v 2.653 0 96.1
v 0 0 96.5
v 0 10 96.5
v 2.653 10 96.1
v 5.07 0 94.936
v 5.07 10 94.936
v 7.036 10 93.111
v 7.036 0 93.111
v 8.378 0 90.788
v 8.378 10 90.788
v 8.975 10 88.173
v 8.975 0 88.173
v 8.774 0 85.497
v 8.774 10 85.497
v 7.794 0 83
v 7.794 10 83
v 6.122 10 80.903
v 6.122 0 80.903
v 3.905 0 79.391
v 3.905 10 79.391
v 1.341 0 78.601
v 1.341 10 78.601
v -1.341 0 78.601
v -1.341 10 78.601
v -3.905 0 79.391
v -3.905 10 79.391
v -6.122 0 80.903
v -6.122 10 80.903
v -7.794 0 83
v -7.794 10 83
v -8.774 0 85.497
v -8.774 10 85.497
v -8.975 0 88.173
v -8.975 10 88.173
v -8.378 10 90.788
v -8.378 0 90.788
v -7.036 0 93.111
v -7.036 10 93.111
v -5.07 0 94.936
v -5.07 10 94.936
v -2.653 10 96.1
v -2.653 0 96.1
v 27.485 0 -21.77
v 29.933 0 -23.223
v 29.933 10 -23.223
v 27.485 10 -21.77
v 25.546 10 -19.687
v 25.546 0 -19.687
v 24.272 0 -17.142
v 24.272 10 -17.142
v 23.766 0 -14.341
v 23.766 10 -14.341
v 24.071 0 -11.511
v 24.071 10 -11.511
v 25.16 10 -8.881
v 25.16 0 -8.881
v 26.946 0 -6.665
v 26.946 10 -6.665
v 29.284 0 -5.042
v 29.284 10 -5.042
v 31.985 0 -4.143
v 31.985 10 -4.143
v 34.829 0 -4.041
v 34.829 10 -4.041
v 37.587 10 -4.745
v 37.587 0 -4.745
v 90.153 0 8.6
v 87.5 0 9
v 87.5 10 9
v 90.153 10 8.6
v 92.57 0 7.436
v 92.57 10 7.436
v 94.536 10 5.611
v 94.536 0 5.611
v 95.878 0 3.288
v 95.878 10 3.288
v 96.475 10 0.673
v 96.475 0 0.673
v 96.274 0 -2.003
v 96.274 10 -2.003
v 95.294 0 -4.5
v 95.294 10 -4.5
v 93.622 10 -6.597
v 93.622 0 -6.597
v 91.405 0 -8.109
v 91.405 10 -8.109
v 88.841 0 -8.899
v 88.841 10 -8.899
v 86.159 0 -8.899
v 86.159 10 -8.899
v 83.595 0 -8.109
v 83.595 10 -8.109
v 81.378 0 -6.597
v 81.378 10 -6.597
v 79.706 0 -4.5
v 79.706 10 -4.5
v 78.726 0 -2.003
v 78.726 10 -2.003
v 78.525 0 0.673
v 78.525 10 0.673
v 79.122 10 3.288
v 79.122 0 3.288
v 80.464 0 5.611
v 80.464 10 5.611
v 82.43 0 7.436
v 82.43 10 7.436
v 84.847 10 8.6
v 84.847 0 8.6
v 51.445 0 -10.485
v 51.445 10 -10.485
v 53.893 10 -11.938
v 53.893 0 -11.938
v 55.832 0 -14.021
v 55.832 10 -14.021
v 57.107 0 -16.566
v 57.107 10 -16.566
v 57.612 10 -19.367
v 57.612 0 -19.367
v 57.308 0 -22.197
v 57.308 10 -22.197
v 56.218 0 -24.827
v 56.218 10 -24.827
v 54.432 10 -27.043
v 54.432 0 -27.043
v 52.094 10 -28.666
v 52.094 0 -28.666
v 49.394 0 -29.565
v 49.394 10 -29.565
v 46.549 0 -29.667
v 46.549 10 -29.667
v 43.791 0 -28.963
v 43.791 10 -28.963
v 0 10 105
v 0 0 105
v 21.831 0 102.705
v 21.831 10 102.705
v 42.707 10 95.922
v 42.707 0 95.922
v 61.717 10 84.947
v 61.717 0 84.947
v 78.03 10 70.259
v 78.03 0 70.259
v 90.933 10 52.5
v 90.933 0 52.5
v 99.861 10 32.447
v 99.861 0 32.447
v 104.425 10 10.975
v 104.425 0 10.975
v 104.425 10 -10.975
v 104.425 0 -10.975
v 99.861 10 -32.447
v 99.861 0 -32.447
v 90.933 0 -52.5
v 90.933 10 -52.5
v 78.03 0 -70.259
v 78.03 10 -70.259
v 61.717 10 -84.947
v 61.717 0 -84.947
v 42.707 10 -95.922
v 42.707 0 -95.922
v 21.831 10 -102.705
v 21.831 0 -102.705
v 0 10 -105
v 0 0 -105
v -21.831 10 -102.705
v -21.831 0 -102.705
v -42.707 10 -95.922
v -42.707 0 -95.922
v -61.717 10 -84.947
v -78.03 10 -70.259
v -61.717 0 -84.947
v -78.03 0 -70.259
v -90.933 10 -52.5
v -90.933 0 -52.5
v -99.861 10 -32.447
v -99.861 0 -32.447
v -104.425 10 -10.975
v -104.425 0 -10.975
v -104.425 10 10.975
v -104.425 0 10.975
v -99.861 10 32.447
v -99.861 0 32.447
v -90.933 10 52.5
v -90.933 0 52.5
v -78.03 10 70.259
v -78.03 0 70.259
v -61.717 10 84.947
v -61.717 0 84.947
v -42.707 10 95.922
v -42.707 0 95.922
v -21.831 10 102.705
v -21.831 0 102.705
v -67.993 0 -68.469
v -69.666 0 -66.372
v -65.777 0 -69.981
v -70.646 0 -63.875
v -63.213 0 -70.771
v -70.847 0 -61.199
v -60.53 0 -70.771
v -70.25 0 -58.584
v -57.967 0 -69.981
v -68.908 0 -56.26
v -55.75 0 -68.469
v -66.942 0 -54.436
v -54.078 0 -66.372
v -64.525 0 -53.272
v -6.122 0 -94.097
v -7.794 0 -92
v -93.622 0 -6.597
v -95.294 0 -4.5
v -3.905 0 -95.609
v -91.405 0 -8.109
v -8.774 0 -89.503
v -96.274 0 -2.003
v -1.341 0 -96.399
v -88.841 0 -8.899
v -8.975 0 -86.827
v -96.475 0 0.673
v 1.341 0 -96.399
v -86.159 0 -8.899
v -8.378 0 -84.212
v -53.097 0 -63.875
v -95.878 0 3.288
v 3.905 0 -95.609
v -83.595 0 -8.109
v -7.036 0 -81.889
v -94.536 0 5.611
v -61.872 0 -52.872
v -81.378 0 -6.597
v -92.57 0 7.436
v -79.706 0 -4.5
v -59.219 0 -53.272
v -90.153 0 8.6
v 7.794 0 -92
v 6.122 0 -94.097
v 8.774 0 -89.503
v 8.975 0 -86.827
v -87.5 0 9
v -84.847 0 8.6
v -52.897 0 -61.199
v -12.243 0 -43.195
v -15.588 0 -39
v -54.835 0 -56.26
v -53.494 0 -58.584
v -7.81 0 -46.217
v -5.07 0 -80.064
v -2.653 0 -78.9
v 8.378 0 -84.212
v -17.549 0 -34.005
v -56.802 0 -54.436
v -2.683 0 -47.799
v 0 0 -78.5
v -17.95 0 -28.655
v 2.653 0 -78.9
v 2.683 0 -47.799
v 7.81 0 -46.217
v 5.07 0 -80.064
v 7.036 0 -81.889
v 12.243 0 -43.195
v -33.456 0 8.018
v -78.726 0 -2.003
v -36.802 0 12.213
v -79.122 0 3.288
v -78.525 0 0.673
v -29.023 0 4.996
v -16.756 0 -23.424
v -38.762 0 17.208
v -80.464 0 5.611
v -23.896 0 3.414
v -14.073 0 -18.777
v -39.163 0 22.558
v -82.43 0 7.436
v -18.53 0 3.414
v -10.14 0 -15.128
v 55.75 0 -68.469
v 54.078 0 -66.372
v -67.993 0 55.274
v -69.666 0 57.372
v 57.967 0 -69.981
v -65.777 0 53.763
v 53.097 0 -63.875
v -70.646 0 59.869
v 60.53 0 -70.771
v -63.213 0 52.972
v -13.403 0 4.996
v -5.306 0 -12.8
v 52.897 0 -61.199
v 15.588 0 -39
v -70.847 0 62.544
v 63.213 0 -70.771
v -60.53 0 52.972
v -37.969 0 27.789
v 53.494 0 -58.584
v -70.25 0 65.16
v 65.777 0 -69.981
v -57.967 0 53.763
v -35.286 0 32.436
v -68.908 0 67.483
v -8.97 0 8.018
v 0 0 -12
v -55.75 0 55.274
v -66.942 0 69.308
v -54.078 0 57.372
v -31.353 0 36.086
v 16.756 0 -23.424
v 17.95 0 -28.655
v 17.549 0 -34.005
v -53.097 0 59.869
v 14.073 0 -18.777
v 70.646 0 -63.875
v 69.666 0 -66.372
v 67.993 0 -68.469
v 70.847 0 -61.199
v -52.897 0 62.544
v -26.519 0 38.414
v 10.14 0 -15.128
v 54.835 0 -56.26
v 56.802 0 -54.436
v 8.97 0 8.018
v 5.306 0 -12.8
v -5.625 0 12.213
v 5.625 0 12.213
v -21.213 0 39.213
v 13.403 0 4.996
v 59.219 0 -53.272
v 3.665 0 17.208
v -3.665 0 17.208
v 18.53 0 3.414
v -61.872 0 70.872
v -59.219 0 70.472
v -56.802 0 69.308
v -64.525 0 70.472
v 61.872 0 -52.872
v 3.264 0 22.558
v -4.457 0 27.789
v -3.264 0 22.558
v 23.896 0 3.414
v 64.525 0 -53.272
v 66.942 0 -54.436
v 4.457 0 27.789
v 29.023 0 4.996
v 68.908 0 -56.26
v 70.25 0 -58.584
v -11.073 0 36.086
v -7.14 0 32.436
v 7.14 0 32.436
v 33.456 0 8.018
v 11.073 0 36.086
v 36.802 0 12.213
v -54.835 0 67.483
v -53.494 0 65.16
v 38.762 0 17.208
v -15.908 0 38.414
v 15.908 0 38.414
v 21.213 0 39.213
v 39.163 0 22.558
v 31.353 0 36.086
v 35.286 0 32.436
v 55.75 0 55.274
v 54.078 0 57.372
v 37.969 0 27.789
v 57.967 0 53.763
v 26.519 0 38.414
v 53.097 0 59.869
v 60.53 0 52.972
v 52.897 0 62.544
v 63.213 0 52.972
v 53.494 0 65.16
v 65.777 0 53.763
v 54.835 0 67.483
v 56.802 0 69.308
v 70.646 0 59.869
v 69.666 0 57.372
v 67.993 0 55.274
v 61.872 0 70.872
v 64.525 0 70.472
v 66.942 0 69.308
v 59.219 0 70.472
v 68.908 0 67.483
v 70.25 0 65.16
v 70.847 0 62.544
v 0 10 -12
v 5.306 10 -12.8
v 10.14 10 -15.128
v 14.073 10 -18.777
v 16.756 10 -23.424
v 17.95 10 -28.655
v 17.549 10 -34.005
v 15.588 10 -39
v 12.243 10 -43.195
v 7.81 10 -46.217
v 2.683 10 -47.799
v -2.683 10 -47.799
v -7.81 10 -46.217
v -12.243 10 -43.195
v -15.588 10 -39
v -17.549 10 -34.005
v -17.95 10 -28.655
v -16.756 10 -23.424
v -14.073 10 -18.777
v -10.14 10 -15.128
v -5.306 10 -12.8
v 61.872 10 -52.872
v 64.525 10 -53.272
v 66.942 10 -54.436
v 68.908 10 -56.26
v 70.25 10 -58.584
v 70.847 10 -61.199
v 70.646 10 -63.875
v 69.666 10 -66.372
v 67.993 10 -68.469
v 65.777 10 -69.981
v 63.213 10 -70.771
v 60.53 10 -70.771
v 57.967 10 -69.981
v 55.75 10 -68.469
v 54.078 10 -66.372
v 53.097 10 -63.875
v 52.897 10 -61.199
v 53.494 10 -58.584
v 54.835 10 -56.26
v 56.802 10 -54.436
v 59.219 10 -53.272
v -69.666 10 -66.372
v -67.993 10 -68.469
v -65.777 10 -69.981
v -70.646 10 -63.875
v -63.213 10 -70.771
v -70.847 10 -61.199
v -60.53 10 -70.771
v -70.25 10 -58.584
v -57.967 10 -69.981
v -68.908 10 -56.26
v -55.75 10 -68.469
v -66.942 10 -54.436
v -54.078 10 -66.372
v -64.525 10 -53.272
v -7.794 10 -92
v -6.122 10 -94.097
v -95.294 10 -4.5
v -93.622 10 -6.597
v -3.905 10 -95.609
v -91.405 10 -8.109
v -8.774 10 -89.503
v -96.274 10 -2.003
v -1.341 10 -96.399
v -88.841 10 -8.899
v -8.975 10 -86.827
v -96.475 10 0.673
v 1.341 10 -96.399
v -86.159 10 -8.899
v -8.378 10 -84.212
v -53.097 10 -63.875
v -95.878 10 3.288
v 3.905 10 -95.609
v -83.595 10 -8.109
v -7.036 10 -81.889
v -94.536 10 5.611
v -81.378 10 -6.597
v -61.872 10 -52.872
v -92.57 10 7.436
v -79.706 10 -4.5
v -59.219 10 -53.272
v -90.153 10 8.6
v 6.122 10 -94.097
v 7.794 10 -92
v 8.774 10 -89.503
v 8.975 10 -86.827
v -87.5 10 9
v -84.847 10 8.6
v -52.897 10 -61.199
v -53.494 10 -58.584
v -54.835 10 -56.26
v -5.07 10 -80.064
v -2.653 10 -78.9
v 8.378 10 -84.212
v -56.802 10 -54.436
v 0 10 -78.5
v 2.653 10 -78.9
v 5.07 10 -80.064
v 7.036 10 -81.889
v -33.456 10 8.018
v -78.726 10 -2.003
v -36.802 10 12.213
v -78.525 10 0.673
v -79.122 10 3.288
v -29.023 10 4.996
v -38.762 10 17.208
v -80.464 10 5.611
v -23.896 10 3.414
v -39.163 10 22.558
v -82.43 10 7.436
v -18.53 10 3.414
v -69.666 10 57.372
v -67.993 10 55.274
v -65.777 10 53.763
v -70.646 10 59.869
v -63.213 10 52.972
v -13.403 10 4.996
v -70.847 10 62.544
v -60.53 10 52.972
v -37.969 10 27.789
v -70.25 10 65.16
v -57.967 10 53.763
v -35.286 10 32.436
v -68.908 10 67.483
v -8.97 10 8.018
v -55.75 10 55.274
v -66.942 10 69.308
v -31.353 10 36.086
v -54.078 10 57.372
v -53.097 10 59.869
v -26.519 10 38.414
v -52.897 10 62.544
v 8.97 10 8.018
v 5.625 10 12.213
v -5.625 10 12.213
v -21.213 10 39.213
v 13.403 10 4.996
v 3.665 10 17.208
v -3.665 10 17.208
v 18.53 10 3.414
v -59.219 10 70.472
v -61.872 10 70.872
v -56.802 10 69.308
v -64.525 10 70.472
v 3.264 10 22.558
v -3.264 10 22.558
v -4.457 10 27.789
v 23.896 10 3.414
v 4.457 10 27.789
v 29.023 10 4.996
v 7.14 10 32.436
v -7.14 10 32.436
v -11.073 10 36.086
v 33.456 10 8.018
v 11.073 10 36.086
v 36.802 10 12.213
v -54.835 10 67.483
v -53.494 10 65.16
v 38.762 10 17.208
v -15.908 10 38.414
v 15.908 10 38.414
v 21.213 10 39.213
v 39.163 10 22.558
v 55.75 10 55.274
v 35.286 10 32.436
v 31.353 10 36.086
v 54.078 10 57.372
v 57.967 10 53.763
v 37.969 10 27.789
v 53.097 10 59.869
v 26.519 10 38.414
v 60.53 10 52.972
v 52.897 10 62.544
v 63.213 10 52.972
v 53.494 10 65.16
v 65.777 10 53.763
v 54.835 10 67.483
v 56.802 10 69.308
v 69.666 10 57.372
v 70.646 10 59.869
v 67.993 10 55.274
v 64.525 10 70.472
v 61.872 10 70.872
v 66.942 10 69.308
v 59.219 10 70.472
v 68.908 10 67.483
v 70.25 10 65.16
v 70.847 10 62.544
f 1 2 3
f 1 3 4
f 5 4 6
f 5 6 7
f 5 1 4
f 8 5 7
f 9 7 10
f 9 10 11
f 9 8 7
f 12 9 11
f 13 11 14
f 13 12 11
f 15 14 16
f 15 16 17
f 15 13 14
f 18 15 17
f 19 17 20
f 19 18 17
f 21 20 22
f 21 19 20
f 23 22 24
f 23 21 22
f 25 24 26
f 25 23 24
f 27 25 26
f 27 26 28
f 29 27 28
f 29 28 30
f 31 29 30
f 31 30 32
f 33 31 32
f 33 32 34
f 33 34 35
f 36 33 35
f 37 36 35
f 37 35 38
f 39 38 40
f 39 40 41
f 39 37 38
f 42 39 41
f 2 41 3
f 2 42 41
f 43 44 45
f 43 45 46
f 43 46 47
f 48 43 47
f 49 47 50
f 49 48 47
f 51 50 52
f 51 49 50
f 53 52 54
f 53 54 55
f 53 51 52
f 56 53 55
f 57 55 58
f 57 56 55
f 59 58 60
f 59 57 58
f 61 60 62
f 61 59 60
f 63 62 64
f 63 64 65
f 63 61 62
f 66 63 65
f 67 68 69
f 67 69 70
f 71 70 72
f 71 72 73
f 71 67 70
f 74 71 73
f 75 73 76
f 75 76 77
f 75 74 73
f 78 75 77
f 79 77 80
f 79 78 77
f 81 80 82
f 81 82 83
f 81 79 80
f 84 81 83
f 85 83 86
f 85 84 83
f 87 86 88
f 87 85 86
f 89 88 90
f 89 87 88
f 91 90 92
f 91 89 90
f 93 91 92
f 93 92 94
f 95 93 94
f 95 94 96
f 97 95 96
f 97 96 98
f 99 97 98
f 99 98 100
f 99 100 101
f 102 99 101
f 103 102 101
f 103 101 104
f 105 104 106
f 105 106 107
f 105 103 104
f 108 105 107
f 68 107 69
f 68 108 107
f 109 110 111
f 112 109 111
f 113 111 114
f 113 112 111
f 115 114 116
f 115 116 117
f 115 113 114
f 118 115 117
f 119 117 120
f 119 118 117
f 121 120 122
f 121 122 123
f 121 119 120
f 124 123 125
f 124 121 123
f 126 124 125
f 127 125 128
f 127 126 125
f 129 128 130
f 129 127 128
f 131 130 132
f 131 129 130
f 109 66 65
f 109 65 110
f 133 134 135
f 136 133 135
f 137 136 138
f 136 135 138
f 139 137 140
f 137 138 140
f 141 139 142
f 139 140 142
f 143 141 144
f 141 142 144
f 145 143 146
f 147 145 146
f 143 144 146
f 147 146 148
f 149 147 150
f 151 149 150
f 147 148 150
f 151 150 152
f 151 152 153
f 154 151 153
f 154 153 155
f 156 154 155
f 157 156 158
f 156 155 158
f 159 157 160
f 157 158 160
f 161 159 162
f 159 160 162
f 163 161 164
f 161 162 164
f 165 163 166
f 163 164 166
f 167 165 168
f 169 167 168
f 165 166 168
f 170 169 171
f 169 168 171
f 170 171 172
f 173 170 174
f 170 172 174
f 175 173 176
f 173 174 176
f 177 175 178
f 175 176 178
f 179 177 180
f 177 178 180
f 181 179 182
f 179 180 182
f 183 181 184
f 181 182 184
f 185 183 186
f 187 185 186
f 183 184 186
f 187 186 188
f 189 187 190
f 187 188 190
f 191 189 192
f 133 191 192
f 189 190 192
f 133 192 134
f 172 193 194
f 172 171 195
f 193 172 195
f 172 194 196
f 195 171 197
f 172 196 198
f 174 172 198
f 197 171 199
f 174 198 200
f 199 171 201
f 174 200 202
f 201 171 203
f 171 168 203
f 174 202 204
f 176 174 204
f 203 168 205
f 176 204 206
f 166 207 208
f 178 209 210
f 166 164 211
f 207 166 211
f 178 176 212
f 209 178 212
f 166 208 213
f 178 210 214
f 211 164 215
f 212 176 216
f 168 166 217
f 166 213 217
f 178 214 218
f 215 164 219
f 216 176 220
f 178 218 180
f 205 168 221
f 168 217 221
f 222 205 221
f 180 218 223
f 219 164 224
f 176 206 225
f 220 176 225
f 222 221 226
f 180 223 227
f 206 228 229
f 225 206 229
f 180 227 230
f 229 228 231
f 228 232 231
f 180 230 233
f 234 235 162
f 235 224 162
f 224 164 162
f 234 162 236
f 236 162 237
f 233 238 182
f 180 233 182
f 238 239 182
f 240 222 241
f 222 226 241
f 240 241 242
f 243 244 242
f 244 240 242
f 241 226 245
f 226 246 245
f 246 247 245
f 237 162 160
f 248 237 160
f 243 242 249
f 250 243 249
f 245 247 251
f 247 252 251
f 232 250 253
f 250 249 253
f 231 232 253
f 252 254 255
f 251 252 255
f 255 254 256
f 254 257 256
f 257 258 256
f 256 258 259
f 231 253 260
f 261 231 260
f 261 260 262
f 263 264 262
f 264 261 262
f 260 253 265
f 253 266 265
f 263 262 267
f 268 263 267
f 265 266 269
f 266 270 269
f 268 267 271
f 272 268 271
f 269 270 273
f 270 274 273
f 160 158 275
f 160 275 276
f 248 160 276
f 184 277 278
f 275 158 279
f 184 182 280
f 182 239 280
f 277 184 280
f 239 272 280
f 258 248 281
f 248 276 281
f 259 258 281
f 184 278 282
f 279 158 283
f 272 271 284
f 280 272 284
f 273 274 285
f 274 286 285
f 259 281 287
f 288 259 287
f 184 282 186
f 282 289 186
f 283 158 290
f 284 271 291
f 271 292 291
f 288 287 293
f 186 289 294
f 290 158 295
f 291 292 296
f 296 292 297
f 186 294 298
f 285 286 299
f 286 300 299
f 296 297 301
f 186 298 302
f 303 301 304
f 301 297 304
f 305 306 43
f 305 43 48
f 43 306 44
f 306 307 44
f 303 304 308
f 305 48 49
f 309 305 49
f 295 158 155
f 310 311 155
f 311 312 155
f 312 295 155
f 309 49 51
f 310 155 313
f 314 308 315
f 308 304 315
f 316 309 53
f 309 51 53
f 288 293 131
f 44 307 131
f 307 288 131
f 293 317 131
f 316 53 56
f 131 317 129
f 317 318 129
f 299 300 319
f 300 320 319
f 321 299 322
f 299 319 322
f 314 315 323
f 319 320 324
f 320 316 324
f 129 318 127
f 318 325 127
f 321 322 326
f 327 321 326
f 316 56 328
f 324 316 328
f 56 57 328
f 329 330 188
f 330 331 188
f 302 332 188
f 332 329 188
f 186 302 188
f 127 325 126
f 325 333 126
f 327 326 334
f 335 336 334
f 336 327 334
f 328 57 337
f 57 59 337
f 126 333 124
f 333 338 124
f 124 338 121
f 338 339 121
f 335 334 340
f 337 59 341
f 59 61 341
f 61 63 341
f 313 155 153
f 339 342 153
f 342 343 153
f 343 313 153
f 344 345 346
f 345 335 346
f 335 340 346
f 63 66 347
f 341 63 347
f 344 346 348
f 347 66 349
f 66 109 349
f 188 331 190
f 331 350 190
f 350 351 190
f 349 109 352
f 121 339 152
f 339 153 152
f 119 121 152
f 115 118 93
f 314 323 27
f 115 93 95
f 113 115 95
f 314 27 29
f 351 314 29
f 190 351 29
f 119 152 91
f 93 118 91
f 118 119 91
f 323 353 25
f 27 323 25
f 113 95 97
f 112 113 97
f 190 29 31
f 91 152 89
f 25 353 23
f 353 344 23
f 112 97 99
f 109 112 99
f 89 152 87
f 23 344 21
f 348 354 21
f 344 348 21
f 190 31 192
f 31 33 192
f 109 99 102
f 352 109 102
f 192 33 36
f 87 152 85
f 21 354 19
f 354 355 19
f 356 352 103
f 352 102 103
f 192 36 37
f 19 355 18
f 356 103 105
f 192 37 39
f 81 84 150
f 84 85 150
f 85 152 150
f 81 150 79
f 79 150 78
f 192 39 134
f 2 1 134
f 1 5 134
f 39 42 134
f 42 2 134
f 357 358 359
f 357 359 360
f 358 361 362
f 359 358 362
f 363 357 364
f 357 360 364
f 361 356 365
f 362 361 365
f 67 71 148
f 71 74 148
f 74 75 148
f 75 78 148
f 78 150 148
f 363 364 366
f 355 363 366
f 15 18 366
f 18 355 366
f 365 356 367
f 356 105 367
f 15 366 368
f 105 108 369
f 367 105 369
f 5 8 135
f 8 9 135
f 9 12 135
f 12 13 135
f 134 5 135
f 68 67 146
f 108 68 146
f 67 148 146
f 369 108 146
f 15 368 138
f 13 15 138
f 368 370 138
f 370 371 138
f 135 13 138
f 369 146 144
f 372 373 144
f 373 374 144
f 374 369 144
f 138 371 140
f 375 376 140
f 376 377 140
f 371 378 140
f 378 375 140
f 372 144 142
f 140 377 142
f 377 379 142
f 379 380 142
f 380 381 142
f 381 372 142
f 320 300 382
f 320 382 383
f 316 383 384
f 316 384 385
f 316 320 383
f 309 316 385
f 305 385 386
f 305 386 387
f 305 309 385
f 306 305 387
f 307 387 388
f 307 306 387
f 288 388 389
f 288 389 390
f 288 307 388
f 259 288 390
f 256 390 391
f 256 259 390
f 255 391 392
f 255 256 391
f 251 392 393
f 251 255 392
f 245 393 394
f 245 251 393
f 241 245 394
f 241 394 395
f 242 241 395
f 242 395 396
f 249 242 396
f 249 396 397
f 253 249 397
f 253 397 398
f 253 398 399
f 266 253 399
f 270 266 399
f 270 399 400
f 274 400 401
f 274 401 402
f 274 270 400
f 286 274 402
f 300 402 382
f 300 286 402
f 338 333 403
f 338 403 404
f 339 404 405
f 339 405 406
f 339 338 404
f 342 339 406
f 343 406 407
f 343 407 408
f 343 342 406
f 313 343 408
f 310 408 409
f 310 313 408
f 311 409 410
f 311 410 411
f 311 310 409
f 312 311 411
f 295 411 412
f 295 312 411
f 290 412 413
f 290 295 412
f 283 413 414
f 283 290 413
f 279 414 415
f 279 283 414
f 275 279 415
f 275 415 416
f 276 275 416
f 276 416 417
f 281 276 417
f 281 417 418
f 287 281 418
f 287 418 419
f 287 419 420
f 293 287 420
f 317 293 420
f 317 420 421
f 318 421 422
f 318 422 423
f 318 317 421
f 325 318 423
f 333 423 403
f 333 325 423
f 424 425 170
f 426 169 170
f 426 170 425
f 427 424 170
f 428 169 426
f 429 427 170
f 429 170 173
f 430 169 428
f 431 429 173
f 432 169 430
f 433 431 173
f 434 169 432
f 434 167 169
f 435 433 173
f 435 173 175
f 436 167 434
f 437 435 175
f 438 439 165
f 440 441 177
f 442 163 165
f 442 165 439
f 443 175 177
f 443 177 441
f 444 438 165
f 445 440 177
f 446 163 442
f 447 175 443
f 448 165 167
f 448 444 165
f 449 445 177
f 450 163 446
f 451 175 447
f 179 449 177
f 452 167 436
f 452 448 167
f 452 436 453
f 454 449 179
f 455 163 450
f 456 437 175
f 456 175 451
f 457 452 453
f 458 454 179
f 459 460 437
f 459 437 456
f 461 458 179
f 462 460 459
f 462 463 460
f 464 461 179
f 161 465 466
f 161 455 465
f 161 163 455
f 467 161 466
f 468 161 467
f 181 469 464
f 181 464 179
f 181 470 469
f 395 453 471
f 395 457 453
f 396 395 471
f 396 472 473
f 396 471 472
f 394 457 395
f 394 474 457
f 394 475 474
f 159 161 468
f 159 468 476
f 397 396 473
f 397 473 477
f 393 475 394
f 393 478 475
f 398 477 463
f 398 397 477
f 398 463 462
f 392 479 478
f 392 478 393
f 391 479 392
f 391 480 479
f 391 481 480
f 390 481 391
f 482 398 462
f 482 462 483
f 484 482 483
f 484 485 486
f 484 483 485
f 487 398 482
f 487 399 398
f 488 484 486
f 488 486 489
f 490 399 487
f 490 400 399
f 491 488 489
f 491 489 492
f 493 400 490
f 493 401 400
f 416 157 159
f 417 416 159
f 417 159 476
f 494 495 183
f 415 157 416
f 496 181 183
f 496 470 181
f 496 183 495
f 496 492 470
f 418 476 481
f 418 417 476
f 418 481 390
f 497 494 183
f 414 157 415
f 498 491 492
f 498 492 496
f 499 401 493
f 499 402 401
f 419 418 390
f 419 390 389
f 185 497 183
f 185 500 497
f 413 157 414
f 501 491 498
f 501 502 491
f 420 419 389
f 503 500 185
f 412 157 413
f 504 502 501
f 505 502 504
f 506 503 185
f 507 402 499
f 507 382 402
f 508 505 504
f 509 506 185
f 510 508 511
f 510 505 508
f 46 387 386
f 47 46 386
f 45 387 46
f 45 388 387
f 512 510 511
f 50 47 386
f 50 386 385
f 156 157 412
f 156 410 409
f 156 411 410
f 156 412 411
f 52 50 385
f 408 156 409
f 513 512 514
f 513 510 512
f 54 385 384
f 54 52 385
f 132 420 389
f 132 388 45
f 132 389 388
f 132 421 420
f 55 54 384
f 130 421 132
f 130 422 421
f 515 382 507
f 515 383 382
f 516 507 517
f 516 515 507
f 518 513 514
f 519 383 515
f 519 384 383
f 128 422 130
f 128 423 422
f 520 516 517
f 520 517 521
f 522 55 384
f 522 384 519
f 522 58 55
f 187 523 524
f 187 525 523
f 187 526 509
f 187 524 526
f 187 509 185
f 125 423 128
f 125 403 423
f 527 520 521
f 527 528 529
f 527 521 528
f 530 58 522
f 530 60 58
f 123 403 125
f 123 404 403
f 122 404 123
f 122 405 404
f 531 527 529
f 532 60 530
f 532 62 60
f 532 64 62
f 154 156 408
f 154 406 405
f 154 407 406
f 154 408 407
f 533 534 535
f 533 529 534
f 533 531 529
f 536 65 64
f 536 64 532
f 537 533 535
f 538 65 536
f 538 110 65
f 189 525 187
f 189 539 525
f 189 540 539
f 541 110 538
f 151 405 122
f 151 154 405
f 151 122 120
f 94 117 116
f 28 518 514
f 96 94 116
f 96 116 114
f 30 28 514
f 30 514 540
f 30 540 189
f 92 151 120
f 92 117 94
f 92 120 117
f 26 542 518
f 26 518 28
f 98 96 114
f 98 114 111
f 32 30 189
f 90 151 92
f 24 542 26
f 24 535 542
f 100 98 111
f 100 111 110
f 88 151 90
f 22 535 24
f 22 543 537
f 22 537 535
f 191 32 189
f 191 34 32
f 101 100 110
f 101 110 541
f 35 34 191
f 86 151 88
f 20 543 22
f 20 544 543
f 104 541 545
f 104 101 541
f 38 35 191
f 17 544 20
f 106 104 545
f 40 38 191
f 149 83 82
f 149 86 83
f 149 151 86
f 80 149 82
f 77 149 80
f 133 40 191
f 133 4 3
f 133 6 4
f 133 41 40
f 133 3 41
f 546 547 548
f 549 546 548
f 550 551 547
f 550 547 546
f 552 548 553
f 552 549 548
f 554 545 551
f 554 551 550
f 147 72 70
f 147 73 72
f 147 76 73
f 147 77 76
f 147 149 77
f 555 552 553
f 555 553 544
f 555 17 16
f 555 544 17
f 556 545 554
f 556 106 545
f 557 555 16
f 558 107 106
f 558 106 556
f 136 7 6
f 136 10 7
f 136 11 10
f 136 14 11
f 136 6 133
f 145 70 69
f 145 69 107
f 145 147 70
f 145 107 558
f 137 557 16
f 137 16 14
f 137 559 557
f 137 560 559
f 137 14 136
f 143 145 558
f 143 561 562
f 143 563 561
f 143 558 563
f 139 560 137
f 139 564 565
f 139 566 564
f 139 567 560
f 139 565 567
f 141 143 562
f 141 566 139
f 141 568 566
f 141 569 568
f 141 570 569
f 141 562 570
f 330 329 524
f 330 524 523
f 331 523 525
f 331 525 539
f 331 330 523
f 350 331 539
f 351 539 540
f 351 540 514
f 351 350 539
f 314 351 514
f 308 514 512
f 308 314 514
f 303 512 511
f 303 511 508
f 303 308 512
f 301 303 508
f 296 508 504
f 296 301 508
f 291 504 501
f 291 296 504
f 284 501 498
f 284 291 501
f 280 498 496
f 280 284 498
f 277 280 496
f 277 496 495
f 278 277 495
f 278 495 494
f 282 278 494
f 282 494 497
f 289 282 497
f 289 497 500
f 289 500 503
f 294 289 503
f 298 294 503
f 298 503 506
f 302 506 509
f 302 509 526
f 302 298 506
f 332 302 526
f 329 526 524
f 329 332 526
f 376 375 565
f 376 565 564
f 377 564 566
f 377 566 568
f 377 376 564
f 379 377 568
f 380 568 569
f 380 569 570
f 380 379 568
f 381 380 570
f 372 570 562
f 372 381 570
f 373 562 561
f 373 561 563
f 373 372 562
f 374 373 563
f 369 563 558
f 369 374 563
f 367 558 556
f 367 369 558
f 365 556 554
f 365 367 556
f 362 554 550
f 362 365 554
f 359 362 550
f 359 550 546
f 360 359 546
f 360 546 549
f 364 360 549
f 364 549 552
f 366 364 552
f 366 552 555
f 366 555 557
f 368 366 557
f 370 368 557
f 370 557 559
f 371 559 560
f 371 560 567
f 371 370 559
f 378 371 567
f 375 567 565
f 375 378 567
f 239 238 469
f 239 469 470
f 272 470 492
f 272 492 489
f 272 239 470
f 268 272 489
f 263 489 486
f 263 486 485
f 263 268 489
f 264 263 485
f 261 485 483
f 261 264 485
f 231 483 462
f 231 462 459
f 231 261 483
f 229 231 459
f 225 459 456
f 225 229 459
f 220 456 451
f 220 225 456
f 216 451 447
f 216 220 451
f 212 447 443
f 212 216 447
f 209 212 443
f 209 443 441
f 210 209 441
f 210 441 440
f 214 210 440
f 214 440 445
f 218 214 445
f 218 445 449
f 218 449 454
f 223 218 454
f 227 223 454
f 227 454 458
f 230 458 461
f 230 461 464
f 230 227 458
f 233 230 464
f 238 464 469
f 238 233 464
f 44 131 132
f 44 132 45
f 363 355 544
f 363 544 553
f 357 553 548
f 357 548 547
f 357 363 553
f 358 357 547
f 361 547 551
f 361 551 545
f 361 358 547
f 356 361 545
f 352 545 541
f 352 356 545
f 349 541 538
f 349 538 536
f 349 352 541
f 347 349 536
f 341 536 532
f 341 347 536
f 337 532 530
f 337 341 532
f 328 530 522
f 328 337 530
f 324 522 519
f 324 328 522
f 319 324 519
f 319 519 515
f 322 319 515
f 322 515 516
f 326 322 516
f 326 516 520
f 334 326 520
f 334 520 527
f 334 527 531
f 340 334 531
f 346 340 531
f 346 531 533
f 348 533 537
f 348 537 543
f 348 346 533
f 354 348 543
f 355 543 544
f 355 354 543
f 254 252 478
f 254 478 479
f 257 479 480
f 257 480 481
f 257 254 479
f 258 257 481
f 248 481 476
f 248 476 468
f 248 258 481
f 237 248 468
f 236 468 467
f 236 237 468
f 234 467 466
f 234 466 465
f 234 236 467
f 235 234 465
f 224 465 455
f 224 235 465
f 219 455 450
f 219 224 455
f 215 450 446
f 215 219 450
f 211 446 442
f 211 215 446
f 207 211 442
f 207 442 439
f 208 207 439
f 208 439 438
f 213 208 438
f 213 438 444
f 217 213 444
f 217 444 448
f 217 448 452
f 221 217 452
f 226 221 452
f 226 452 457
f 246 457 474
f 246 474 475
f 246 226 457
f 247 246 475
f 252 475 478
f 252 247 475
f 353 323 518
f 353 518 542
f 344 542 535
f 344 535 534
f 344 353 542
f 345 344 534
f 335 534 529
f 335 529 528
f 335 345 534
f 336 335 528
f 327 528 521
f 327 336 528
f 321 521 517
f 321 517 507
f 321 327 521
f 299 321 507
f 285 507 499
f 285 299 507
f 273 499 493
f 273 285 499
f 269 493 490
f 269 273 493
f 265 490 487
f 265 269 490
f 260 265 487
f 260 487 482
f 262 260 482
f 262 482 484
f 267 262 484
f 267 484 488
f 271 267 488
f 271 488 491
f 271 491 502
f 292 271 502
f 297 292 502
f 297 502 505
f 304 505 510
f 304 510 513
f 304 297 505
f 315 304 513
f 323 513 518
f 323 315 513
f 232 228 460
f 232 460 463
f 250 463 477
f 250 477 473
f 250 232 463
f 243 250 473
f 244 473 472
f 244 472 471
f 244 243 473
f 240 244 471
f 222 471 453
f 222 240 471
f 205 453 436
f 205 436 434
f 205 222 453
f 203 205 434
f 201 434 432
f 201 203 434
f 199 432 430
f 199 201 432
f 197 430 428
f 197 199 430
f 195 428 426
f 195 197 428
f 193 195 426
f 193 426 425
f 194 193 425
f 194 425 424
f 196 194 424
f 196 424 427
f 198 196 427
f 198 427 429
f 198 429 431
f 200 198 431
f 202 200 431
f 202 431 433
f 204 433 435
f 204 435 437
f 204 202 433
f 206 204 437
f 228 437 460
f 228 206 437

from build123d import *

# Parameters (mm, degrees)
SKETCH3_R           = 105
SKETCH3_R_2         = 18
SKETCH3_R_3         = 9
BOSS_EXTRUDE2_DEPTH = 10


with BuildPart() as part:
    # Sketch3 → Boss-Extrude2 (new body)
    with BuildSketch(Plane(origin=(0, 0, 0), x_dir=(1, 0, 0), z_dir=(0, 1, 0))):
        with Locations(Location((0, 0, 0), (0, 0, 270))):
            Circle(SKETCH3_R)
        with Locations(Location((-21.213203436, -21.213203436, 0), (0, 0, 270))):
            Circle(SKETCH3_R_2, mode=Mode.SUBTRACT)
        with Locations(Location((21.213203436, -21.213203436, 0), (0, 0, 270))):
            Circle(SKETCH3_R_2, mode=Mode.SUBTRACT)
        with Locations(Location((0, 30, 0), (0, 0, 270))):
            Circle(SKETCH3_R_2, mode=Mode.SUBTRACT)
        with Locations(Location((87.5, 0, 0), (0, 0, 270))):
            Circle(SKETCH3_R_3, mode=Mode.SUBTRACT)
        with Locations(Location((61.871843354, -61.871843354, 0), (0, 0, 270))):
            Circle(SKETCH3_R_3, mode=Mode.SUBTRACT)
        with Locations(Location((0, -87.5, 0), (0, 0, 270))):
            Circle(SKETCH3_R_3, mode=Mode.SUBTRACT)
        with Locations(Location((-61.871843354, -61.871843354, 0), (0, 0, 270))):
            Circle(SKETCH3_R_3, mode=Mode.SUBTRACT)
        with Locations(Location((-87.5, 0, 0), (0, 0, 270))):
            Circle(SKETCH3_R_3, mode=Mode.SUBTRACT)
        with Locations(Location((-61.871843354, 61.871843354, 0), (0, 0, 270))):
            Circle(SKETCH3_R_3, mode=Mode.SUBTRACT)
        with Locations(Location((61.871843354, 61.871843354, 0), (0, 0, 270))):
            Circle(SKETCH3_R_3, mode=Mode.SUBTRACT)
        with Locations(Location((0, 87.5, 0), (0, 0, 270))):
            Circle(SKETCH3_R_3, mode=Mode.SUBTRACT)
        with BuildLine():
            ThreePointArc((29.933258413, 23.222683604), (24.521297412, 10.157053955), (37.586927061, 4.745092953))
            Line((37.586927061, 4.745092953), (51.445120048, 10.485344439))
            ThreePointArc((51.445120048, 10.485344439), (56.85708105, 23.550974088), (43.791451401, 28.962935089))
            Line((43.791451401, 28.962935089), (29.933258413, 23.222683604))
        make_face(mode=Mode.SUBTRACT)
    extrude(amount=BOSS_EXTRUDE2_DEPTH)


solid = part.part
